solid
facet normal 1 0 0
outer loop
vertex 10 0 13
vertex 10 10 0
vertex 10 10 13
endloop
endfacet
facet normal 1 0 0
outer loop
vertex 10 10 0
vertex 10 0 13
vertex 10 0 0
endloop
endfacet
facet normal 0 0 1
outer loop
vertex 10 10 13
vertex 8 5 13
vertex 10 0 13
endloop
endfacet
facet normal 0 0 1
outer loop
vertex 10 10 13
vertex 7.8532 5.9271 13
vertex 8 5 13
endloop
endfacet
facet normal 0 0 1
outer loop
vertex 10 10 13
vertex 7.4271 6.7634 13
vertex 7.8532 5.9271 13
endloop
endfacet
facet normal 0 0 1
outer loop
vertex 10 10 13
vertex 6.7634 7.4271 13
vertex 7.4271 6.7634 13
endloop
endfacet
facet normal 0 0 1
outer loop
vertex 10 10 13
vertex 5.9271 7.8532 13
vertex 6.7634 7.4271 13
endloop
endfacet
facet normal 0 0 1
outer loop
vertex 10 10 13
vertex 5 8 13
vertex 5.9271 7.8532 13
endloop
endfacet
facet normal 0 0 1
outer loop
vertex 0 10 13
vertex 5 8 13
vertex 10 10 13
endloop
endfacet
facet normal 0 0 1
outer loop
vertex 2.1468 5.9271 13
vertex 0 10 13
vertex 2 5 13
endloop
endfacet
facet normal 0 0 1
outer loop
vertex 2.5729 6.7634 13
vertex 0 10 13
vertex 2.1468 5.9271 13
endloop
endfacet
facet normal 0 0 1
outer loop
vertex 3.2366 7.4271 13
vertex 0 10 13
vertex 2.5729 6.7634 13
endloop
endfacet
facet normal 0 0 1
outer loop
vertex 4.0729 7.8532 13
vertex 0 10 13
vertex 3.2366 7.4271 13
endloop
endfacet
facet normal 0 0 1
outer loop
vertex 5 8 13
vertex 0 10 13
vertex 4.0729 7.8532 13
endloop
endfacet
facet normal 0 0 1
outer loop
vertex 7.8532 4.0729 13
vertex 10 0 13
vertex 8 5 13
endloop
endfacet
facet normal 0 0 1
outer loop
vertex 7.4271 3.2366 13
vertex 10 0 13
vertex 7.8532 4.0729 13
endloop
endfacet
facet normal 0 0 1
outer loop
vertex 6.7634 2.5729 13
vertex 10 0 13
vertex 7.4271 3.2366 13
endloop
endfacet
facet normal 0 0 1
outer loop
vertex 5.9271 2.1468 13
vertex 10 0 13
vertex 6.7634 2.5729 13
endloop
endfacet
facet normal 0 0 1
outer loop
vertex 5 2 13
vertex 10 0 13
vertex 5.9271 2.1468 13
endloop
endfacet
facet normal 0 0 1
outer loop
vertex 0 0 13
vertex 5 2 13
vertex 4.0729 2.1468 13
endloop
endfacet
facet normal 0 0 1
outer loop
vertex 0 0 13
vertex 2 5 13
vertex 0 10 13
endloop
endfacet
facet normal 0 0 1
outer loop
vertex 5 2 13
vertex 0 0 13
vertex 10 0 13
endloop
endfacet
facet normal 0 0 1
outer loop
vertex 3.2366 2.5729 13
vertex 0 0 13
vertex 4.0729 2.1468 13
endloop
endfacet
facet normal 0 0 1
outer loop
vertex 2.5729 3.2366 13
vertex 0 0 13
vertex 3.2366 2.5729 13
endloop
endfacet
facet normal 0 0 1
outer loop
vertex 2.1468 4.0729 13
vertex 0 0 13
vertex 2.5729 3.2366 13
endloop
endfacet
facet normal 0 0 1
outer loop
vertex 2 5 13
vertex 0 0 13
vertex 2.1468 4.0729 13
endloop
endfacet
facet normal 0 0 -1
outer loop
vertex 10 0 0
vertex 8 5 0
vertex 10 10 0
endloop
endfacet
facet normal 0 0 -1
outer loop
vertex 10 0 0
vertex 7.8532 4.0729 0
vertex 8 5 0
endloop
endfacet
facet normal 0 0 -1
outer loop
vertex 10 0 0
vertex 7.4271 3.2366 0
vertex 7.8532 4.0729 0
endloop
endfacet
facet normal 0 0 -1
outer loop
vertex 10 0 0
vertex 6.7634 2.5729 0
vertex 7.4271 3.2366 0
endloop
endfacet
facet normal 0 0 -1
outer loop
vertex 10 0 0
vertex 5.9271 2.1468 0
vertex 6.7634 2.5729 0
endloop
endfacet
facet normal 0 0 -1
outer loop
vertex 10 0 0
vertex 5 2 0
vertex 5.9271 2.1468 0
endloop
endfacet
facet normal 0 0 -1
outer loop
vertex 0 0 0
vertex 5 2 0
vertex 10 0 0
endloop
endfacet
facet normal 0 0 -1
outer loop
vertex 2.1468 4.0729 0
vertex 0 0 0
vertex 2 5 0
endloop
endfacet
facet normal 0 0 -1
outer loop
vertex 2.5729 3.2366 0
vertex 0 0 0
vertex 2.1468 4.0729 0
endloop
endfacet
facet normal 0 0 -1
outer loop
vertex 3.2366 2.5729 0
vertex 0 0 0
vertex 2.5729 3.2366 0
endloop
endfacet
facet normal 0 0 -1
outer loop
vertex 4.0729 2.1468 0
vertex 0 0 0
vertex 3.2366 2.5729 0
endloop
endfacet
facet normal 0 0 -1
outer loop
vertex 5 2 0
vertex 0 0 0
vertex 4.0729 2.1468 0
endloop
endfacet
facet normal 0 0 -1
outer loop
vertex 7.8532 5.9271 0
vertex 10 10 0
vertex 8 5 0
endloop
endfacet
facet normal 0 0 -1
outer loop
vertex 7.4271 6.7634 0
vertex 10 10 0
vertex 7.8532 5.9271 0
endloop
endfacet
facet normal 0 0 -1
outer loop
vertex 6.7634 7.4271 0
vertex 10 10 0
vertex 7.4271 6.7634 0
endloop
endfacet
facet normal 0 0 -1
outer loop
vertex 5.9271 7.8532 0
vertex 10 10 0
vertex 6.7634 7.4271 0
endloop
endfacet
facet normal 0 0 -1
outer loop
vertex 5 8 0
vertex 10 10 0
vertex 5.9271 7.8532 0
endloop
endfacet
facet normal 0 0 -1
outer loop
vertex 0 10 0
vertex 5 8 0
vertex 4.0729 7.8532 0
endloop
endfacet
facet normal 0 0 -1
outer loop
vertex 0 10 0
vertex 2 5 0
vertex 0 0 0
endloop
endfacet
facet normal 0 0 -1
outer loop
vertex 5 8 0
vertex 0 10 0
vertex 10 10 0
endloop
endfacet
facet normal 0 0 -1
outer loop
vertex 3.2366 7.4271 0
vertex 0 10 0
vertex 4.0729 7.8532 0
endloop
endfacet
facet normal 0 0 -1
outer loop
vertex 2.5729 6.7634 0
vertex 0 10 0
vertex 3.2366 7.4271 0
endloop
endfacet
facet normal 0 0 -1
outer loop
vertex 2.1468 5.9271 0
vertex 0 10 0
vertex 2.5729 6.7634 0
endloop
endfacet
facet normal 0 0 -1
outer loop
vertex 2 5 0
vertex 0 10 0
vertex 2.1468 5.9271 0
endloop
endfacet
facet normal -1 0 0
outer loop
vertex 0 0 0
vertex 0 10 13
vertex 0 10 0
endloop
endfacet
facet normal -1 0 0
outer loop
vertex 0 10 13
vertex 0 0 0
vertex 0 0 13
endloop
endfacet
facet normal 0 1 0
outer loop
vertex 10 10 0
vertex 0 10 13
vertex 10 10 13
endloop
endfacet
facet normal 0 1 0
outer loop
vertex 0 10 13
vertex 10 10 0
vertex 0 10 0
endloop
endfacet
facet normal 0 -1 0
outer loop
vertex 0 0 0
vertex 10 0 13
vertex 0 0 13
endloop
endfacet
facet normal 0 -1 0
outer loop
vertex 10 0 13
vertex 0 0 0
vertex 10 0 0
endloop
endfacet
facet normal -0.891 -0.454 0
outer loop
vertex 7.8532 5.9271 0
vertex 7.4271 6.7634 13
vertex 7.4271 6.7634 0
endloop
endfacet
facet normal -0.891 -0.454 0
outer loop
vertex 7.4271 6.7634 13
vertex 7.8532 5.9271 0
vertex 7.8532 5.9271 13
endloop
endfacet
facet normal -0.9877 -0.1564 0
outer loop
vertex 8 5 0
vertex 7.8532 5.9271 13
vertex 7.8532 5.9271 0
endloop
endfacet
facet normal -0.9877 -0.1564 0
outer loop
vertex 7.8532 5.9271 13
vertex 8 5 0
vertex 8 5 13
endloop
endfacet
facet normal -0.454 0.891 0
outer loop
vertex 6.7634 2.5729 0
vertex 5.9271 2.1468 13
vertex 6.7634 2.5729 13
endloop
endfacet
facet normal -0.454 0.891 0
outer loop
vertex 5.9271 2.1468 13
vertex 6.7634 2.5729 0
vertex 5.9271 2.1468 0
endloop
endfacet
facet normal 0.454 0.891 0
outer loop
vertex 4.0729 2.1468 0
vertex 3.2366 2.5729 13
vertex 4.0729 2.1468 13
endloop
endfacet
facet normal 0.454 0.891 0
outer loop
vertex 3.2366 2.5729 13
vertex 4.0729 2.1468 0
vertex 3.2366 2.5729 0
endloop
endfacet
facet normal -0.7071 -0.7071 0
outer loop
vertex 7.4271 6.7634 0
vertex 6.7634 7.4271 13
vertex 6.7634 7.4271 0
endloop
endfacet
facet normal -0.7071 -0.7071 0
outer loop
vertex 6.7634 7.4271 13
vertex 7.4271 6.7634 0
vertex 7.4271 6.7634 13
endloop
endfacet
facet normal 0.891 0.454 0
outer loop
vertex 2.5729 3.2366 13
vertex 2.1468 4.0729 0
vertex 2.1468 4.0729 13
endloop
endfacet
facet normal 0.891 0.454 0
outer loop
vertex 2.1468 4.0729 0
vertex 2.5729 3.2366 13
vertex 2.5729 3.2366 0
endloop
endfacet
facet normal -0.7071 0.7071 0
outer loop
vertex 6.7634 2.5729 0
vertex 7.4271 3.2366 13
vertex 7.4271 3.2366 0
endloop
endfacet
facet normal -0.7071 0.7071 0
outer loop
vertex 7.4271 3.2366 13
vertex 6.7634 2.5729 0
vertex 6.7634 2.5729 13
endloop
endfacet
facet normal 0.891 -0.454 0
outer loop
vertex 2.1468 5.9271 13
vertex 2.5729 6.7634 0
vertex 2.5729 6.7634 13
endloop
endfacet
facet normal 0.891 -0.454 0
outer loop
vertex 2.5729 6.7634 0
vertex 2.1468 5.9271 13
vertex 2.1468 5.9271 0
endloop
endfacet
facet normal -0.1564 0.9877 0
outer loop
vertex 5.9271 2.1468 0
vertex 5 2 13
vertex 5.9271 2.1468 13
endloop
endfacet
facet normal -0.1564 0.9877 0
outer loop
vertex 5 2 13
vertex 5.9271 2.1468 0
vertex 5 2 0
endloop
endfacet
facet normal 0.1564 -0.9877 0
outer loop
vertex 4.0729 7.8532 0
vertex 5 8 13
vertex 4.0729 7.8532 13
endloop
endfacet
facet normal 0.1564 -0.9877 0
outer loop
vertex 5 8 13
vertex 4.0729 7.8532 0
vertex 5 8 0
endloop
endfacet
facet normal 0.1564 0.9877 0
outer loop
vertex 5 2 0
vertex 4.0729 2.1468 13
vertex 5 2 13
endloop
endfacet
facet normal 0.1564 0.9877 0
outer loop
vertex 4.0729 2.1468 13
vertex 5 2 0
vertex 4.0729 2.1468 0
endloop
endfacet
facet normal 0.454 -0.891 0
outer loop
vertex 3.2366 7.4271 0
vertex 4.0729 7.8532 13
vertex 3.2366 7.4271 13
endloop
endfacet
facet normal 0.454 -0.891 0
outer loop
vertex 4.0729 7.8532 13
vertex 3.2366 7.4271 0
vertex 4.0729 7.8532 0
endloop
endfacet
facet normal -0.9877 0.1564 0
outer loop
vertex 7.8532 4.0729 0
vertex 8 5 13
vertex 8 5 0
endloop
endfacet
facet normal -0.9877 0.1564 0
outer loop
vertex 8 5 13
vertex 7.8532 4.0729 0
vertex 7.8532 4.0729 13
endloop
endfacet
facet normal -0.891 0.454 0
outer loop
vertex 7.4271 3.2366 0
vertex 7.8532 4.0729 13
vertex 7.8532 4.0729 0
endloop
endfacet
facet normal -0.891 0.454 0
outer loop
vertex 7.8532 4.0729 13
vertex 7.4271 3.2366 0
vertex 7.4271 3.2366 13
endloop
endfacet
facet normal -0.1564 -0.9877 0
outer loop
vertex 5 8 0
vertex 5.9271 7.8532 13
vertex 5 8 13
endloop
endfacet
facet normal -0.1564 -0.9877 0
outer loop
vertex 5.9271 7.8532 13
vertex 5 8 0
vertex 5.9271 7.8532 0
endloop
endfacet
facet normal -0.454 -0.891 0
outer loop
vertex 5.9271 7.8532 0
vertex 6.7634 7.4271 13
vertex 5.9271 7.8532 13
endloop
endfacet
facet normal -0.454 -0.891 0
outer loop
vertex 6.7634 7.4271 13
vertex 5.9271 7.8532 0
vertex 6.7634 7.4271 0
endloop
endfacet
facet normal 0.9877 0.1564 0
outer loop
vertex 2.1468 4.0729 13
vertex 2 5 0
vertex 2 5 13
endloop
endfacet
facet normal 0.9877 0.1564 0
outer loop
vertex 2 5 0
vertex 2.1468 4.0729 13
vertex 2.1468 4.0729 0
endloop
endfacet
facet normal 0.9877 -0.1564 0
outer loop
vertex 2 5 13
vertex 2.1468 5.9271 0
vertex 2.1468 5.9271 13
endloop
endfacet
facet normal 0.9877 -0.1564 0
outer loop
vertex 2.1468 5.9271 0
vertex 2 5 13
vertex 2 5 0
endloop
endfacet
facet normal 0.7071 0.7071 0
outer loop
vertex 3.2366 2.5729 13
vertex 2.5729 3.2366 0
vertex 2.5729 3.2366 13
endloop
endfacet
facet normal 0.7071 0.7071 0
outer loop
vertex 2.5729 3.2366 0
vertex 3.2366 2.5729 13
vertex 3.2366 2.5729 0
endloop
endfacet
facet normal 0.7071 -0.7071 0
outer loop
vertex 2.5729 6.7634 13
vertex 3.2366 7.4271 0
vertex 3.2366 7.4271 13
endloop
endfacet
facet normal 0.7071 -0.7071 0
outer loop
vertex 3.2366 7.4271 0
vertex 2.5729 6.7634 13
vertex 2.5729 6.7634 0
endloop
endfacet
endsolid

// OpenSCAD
//cube([10,10,30]);
//translate([5,5,30])cylinder(h=50, d=4.5, $fn=20);

difference() {
    cube([10,10,13]);
    translate([5,5,-1])cylinder(h=15, d=6, $fn=20);
}
